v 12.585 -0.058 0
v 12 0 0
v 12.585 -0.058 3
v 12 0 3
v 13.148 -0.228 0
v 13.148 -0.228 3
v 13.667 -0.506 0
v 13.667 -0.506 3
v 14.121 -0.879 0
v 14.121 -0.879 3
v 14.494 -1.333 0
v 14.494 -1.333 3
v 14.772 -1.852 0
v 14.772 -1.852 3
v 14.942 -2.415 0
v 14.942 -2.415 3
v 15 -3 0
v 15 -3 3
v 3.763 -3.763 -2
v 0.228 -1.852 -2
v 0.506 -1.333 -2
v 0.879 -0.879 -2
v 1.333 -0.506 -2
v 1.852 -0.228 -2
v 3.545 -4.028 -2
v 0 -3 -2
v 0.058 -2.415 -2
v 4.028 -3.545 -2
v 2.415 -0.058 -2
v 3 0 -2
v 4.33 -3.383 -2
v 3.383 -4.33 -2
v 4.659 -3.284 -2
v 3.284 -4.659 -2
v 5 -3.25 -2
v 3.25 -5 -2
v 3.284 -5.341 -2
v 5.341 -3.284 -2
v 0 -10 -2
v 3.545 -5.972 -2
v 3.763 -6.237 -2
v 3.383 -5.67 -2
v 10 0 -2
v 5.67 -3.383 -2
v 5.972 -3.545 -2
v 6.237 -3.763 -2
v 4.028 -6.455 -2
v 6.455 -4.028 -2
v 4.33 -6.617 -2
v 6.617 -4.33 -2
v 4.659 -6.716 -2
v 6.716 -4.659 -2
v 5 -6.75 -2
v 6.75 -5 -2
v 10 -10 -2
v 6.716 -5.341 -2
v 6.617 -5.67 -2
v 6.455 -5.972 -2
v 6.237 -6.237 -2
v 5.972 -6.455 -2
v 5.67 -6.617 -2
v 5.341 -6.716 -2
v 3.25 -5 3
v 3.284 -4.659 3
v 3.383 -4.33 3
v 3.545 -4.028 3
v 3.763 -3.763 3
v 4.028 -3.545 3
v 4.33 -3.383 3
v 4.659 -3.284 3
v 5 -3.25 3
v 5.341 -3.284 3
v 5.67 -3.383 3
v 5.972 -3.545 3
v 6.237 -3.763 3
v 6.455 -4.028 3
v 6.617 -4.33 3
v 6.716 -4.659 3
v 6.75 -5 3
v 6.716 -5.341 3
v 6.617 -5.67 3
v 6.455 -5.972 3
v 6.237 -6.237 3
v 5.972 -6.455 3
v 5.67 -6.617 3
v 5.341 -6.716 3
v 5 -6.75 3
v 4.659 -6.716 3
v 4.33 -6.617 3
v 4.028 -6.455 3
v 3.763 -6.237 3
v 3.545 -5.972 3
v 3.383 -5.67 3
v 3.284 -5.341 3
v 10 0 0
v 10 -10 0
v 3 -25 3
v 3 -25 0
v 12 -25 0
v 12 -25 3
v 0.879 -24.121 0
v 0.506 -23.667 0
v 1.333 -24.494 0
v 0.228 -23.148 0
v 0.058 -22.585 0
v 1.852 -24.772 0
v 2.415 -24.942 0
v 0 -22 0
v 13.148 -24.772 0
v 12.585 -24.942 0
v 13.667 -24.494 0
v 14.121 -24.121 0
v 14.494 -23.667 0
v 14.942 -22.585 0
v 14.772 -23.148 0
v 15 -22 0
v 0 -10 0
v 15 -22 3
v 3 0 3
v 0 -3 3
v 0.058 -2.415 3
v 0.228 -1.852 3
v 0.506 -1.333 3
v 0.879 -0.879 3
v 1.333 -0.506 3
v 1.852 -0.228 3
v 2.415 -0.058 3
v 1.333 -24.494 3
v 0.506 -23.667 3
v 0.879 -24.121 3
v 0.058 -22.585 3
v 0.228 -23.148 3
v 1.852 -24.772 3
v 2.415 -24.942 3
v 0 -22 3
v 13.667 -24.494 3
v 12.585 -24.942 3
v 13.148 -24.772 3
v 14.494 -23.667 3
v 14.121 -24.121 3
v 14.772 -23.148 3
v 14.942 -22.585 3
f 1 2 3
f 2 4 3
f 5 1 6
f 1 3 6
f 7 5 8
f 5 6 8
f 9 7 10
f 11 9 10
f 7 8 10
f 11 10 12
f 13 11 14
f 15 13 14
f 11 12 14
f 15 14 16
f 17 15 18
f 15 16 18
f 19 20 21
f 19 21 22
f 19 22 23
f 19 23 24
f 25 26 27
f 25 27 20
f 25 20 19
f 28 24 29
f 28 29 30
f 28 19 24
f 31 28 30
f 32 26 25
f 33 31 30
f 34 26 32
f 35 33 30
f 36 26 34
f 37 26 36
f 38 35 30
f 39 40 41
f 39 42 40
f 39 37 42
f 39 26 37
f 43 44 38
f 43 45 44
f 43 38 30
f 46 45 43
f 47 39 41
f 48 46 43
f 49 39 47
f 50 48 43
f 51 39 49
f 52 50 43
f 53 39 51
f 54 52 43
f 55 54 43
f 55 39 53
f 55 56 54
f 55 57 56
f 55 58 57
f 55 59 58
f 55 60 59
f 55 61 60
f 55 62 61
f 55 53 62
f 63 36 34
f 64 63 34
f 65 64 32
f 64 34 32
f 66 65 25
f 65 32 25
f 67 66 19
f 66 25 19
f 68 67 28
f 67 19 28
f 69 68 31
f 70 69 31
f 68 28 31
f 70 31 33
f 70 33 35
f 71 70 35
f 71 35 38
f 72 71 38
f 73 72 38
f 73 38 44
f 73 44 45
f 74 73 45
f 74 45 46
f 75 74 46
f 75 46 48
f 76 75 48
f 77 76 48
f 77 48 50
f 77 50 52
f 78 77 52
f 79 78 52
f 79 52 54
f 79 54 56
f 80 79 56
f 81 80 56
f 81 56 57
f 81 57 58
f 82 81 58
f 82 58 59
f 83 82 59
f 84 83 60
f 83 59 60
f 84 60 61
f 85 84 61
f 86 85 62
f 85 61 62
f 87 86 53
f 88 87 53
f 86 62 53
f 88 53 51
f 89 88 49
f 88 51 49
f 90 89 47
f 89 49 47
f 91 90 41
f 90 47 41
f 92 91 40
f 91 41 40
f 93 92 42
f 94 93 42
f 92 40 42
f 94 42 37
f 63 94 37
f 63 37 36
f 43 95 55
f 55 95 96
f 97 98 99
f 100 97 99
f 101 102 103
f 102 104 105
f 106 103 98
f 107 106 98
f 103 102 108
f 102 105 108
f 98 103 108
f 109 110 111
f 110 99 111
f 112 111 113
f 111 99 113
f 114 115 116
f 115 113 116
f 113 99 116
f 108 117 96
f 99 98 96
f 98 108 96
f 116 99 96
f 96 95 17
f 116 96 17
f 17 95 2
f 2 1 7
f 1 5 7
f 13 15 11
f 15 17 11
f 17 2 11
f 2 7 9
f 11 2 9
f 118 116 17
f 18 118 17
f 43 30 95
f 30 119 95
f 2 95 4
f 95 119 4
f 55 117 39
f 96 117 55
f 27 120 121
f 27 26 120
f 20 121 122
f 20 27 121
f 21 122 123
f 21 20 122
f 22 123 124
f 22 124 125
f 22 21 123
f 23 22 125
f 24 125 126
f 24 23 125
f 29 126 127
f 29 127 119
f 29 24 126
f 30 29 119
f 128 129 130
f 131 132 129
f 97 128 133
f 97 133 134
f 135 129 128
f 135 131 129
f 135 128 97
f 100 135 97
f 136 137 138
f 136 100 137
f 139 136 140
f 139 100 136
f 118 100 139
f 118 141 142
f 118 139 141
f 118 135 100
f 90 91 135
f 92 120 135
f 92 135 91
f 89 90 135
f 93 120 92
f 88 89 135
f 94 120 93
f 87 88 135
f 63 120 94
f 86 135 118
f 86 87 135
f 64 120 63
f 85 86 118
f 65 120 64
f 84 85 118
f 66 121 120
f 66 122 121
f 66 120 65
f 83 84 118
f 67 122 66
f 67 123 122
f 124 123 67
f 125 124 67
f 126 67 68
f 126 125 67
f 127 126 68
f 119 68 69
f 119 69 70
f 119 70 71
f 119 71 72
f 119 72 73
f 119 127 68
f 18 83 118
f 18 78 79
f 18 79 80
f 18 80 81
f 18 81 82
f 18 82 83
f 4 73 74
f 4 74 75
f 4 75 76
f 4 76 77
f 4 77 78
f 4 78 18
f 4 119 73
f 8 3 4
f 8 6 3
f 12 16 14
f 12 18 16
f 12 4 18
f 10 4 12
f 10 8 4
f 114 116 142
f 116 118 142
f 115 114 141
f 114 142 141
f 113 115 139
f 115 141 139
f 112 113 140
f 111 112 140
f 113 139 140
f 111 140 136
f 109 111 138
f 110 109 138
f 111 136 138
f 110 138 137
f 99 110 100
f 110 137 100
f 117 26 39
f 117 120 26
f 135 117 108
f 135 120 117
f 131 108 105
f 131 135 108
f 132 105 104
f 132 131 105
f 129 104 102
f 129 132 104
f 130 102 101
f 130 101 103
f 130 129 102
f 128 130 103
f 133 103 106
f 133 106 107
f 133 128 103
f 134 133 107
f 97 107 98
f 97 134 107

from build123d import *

# Parameters (mm, degrees)
F0_W     = 15
F0_H     = 25
F1_DEPTH = 3
F2_W     = 10
F2_H     = 10
F3_DEPTH = 2
F4_R     = 3
F6_D     = 3.5


with BuildPart() as f1:
    # F0 (on Top) → F1 (new body)
    with BuildSketch(Plane.XY):
        with Locations((7.5, -12.5)):
            Rectangle(F0_W, F0_H)
    extrude(amount=F1_DEPTH)

    # F2 (on face) → F3 (join)
    with BuildSketch(Plane(origin=(0, 0, 0), x_dir=(1, 0, 0), z_dir=(0, 0, -1))):
        with Locations((5, 5)):
            Rectangle(F2_W, F2_H)
    extrude(amount=F3_DEPTH)

    # F4
    f4_edges = [f1.edges().sort_by_distance(p)[0] for p in [
        (0, 0, 0.5),
        (0, -25, 1.5),
        (15, -25, 1.5),
        (15, 0, 1.5),
    ]]
    fillet(f4_edges, radius=F4_R)

    # F6 (through all)
    with Locations(Plane.XY.offset(3)):
        with Locations((5, -5)):
            Hole(F6_D / 2)


solid = f1.part
